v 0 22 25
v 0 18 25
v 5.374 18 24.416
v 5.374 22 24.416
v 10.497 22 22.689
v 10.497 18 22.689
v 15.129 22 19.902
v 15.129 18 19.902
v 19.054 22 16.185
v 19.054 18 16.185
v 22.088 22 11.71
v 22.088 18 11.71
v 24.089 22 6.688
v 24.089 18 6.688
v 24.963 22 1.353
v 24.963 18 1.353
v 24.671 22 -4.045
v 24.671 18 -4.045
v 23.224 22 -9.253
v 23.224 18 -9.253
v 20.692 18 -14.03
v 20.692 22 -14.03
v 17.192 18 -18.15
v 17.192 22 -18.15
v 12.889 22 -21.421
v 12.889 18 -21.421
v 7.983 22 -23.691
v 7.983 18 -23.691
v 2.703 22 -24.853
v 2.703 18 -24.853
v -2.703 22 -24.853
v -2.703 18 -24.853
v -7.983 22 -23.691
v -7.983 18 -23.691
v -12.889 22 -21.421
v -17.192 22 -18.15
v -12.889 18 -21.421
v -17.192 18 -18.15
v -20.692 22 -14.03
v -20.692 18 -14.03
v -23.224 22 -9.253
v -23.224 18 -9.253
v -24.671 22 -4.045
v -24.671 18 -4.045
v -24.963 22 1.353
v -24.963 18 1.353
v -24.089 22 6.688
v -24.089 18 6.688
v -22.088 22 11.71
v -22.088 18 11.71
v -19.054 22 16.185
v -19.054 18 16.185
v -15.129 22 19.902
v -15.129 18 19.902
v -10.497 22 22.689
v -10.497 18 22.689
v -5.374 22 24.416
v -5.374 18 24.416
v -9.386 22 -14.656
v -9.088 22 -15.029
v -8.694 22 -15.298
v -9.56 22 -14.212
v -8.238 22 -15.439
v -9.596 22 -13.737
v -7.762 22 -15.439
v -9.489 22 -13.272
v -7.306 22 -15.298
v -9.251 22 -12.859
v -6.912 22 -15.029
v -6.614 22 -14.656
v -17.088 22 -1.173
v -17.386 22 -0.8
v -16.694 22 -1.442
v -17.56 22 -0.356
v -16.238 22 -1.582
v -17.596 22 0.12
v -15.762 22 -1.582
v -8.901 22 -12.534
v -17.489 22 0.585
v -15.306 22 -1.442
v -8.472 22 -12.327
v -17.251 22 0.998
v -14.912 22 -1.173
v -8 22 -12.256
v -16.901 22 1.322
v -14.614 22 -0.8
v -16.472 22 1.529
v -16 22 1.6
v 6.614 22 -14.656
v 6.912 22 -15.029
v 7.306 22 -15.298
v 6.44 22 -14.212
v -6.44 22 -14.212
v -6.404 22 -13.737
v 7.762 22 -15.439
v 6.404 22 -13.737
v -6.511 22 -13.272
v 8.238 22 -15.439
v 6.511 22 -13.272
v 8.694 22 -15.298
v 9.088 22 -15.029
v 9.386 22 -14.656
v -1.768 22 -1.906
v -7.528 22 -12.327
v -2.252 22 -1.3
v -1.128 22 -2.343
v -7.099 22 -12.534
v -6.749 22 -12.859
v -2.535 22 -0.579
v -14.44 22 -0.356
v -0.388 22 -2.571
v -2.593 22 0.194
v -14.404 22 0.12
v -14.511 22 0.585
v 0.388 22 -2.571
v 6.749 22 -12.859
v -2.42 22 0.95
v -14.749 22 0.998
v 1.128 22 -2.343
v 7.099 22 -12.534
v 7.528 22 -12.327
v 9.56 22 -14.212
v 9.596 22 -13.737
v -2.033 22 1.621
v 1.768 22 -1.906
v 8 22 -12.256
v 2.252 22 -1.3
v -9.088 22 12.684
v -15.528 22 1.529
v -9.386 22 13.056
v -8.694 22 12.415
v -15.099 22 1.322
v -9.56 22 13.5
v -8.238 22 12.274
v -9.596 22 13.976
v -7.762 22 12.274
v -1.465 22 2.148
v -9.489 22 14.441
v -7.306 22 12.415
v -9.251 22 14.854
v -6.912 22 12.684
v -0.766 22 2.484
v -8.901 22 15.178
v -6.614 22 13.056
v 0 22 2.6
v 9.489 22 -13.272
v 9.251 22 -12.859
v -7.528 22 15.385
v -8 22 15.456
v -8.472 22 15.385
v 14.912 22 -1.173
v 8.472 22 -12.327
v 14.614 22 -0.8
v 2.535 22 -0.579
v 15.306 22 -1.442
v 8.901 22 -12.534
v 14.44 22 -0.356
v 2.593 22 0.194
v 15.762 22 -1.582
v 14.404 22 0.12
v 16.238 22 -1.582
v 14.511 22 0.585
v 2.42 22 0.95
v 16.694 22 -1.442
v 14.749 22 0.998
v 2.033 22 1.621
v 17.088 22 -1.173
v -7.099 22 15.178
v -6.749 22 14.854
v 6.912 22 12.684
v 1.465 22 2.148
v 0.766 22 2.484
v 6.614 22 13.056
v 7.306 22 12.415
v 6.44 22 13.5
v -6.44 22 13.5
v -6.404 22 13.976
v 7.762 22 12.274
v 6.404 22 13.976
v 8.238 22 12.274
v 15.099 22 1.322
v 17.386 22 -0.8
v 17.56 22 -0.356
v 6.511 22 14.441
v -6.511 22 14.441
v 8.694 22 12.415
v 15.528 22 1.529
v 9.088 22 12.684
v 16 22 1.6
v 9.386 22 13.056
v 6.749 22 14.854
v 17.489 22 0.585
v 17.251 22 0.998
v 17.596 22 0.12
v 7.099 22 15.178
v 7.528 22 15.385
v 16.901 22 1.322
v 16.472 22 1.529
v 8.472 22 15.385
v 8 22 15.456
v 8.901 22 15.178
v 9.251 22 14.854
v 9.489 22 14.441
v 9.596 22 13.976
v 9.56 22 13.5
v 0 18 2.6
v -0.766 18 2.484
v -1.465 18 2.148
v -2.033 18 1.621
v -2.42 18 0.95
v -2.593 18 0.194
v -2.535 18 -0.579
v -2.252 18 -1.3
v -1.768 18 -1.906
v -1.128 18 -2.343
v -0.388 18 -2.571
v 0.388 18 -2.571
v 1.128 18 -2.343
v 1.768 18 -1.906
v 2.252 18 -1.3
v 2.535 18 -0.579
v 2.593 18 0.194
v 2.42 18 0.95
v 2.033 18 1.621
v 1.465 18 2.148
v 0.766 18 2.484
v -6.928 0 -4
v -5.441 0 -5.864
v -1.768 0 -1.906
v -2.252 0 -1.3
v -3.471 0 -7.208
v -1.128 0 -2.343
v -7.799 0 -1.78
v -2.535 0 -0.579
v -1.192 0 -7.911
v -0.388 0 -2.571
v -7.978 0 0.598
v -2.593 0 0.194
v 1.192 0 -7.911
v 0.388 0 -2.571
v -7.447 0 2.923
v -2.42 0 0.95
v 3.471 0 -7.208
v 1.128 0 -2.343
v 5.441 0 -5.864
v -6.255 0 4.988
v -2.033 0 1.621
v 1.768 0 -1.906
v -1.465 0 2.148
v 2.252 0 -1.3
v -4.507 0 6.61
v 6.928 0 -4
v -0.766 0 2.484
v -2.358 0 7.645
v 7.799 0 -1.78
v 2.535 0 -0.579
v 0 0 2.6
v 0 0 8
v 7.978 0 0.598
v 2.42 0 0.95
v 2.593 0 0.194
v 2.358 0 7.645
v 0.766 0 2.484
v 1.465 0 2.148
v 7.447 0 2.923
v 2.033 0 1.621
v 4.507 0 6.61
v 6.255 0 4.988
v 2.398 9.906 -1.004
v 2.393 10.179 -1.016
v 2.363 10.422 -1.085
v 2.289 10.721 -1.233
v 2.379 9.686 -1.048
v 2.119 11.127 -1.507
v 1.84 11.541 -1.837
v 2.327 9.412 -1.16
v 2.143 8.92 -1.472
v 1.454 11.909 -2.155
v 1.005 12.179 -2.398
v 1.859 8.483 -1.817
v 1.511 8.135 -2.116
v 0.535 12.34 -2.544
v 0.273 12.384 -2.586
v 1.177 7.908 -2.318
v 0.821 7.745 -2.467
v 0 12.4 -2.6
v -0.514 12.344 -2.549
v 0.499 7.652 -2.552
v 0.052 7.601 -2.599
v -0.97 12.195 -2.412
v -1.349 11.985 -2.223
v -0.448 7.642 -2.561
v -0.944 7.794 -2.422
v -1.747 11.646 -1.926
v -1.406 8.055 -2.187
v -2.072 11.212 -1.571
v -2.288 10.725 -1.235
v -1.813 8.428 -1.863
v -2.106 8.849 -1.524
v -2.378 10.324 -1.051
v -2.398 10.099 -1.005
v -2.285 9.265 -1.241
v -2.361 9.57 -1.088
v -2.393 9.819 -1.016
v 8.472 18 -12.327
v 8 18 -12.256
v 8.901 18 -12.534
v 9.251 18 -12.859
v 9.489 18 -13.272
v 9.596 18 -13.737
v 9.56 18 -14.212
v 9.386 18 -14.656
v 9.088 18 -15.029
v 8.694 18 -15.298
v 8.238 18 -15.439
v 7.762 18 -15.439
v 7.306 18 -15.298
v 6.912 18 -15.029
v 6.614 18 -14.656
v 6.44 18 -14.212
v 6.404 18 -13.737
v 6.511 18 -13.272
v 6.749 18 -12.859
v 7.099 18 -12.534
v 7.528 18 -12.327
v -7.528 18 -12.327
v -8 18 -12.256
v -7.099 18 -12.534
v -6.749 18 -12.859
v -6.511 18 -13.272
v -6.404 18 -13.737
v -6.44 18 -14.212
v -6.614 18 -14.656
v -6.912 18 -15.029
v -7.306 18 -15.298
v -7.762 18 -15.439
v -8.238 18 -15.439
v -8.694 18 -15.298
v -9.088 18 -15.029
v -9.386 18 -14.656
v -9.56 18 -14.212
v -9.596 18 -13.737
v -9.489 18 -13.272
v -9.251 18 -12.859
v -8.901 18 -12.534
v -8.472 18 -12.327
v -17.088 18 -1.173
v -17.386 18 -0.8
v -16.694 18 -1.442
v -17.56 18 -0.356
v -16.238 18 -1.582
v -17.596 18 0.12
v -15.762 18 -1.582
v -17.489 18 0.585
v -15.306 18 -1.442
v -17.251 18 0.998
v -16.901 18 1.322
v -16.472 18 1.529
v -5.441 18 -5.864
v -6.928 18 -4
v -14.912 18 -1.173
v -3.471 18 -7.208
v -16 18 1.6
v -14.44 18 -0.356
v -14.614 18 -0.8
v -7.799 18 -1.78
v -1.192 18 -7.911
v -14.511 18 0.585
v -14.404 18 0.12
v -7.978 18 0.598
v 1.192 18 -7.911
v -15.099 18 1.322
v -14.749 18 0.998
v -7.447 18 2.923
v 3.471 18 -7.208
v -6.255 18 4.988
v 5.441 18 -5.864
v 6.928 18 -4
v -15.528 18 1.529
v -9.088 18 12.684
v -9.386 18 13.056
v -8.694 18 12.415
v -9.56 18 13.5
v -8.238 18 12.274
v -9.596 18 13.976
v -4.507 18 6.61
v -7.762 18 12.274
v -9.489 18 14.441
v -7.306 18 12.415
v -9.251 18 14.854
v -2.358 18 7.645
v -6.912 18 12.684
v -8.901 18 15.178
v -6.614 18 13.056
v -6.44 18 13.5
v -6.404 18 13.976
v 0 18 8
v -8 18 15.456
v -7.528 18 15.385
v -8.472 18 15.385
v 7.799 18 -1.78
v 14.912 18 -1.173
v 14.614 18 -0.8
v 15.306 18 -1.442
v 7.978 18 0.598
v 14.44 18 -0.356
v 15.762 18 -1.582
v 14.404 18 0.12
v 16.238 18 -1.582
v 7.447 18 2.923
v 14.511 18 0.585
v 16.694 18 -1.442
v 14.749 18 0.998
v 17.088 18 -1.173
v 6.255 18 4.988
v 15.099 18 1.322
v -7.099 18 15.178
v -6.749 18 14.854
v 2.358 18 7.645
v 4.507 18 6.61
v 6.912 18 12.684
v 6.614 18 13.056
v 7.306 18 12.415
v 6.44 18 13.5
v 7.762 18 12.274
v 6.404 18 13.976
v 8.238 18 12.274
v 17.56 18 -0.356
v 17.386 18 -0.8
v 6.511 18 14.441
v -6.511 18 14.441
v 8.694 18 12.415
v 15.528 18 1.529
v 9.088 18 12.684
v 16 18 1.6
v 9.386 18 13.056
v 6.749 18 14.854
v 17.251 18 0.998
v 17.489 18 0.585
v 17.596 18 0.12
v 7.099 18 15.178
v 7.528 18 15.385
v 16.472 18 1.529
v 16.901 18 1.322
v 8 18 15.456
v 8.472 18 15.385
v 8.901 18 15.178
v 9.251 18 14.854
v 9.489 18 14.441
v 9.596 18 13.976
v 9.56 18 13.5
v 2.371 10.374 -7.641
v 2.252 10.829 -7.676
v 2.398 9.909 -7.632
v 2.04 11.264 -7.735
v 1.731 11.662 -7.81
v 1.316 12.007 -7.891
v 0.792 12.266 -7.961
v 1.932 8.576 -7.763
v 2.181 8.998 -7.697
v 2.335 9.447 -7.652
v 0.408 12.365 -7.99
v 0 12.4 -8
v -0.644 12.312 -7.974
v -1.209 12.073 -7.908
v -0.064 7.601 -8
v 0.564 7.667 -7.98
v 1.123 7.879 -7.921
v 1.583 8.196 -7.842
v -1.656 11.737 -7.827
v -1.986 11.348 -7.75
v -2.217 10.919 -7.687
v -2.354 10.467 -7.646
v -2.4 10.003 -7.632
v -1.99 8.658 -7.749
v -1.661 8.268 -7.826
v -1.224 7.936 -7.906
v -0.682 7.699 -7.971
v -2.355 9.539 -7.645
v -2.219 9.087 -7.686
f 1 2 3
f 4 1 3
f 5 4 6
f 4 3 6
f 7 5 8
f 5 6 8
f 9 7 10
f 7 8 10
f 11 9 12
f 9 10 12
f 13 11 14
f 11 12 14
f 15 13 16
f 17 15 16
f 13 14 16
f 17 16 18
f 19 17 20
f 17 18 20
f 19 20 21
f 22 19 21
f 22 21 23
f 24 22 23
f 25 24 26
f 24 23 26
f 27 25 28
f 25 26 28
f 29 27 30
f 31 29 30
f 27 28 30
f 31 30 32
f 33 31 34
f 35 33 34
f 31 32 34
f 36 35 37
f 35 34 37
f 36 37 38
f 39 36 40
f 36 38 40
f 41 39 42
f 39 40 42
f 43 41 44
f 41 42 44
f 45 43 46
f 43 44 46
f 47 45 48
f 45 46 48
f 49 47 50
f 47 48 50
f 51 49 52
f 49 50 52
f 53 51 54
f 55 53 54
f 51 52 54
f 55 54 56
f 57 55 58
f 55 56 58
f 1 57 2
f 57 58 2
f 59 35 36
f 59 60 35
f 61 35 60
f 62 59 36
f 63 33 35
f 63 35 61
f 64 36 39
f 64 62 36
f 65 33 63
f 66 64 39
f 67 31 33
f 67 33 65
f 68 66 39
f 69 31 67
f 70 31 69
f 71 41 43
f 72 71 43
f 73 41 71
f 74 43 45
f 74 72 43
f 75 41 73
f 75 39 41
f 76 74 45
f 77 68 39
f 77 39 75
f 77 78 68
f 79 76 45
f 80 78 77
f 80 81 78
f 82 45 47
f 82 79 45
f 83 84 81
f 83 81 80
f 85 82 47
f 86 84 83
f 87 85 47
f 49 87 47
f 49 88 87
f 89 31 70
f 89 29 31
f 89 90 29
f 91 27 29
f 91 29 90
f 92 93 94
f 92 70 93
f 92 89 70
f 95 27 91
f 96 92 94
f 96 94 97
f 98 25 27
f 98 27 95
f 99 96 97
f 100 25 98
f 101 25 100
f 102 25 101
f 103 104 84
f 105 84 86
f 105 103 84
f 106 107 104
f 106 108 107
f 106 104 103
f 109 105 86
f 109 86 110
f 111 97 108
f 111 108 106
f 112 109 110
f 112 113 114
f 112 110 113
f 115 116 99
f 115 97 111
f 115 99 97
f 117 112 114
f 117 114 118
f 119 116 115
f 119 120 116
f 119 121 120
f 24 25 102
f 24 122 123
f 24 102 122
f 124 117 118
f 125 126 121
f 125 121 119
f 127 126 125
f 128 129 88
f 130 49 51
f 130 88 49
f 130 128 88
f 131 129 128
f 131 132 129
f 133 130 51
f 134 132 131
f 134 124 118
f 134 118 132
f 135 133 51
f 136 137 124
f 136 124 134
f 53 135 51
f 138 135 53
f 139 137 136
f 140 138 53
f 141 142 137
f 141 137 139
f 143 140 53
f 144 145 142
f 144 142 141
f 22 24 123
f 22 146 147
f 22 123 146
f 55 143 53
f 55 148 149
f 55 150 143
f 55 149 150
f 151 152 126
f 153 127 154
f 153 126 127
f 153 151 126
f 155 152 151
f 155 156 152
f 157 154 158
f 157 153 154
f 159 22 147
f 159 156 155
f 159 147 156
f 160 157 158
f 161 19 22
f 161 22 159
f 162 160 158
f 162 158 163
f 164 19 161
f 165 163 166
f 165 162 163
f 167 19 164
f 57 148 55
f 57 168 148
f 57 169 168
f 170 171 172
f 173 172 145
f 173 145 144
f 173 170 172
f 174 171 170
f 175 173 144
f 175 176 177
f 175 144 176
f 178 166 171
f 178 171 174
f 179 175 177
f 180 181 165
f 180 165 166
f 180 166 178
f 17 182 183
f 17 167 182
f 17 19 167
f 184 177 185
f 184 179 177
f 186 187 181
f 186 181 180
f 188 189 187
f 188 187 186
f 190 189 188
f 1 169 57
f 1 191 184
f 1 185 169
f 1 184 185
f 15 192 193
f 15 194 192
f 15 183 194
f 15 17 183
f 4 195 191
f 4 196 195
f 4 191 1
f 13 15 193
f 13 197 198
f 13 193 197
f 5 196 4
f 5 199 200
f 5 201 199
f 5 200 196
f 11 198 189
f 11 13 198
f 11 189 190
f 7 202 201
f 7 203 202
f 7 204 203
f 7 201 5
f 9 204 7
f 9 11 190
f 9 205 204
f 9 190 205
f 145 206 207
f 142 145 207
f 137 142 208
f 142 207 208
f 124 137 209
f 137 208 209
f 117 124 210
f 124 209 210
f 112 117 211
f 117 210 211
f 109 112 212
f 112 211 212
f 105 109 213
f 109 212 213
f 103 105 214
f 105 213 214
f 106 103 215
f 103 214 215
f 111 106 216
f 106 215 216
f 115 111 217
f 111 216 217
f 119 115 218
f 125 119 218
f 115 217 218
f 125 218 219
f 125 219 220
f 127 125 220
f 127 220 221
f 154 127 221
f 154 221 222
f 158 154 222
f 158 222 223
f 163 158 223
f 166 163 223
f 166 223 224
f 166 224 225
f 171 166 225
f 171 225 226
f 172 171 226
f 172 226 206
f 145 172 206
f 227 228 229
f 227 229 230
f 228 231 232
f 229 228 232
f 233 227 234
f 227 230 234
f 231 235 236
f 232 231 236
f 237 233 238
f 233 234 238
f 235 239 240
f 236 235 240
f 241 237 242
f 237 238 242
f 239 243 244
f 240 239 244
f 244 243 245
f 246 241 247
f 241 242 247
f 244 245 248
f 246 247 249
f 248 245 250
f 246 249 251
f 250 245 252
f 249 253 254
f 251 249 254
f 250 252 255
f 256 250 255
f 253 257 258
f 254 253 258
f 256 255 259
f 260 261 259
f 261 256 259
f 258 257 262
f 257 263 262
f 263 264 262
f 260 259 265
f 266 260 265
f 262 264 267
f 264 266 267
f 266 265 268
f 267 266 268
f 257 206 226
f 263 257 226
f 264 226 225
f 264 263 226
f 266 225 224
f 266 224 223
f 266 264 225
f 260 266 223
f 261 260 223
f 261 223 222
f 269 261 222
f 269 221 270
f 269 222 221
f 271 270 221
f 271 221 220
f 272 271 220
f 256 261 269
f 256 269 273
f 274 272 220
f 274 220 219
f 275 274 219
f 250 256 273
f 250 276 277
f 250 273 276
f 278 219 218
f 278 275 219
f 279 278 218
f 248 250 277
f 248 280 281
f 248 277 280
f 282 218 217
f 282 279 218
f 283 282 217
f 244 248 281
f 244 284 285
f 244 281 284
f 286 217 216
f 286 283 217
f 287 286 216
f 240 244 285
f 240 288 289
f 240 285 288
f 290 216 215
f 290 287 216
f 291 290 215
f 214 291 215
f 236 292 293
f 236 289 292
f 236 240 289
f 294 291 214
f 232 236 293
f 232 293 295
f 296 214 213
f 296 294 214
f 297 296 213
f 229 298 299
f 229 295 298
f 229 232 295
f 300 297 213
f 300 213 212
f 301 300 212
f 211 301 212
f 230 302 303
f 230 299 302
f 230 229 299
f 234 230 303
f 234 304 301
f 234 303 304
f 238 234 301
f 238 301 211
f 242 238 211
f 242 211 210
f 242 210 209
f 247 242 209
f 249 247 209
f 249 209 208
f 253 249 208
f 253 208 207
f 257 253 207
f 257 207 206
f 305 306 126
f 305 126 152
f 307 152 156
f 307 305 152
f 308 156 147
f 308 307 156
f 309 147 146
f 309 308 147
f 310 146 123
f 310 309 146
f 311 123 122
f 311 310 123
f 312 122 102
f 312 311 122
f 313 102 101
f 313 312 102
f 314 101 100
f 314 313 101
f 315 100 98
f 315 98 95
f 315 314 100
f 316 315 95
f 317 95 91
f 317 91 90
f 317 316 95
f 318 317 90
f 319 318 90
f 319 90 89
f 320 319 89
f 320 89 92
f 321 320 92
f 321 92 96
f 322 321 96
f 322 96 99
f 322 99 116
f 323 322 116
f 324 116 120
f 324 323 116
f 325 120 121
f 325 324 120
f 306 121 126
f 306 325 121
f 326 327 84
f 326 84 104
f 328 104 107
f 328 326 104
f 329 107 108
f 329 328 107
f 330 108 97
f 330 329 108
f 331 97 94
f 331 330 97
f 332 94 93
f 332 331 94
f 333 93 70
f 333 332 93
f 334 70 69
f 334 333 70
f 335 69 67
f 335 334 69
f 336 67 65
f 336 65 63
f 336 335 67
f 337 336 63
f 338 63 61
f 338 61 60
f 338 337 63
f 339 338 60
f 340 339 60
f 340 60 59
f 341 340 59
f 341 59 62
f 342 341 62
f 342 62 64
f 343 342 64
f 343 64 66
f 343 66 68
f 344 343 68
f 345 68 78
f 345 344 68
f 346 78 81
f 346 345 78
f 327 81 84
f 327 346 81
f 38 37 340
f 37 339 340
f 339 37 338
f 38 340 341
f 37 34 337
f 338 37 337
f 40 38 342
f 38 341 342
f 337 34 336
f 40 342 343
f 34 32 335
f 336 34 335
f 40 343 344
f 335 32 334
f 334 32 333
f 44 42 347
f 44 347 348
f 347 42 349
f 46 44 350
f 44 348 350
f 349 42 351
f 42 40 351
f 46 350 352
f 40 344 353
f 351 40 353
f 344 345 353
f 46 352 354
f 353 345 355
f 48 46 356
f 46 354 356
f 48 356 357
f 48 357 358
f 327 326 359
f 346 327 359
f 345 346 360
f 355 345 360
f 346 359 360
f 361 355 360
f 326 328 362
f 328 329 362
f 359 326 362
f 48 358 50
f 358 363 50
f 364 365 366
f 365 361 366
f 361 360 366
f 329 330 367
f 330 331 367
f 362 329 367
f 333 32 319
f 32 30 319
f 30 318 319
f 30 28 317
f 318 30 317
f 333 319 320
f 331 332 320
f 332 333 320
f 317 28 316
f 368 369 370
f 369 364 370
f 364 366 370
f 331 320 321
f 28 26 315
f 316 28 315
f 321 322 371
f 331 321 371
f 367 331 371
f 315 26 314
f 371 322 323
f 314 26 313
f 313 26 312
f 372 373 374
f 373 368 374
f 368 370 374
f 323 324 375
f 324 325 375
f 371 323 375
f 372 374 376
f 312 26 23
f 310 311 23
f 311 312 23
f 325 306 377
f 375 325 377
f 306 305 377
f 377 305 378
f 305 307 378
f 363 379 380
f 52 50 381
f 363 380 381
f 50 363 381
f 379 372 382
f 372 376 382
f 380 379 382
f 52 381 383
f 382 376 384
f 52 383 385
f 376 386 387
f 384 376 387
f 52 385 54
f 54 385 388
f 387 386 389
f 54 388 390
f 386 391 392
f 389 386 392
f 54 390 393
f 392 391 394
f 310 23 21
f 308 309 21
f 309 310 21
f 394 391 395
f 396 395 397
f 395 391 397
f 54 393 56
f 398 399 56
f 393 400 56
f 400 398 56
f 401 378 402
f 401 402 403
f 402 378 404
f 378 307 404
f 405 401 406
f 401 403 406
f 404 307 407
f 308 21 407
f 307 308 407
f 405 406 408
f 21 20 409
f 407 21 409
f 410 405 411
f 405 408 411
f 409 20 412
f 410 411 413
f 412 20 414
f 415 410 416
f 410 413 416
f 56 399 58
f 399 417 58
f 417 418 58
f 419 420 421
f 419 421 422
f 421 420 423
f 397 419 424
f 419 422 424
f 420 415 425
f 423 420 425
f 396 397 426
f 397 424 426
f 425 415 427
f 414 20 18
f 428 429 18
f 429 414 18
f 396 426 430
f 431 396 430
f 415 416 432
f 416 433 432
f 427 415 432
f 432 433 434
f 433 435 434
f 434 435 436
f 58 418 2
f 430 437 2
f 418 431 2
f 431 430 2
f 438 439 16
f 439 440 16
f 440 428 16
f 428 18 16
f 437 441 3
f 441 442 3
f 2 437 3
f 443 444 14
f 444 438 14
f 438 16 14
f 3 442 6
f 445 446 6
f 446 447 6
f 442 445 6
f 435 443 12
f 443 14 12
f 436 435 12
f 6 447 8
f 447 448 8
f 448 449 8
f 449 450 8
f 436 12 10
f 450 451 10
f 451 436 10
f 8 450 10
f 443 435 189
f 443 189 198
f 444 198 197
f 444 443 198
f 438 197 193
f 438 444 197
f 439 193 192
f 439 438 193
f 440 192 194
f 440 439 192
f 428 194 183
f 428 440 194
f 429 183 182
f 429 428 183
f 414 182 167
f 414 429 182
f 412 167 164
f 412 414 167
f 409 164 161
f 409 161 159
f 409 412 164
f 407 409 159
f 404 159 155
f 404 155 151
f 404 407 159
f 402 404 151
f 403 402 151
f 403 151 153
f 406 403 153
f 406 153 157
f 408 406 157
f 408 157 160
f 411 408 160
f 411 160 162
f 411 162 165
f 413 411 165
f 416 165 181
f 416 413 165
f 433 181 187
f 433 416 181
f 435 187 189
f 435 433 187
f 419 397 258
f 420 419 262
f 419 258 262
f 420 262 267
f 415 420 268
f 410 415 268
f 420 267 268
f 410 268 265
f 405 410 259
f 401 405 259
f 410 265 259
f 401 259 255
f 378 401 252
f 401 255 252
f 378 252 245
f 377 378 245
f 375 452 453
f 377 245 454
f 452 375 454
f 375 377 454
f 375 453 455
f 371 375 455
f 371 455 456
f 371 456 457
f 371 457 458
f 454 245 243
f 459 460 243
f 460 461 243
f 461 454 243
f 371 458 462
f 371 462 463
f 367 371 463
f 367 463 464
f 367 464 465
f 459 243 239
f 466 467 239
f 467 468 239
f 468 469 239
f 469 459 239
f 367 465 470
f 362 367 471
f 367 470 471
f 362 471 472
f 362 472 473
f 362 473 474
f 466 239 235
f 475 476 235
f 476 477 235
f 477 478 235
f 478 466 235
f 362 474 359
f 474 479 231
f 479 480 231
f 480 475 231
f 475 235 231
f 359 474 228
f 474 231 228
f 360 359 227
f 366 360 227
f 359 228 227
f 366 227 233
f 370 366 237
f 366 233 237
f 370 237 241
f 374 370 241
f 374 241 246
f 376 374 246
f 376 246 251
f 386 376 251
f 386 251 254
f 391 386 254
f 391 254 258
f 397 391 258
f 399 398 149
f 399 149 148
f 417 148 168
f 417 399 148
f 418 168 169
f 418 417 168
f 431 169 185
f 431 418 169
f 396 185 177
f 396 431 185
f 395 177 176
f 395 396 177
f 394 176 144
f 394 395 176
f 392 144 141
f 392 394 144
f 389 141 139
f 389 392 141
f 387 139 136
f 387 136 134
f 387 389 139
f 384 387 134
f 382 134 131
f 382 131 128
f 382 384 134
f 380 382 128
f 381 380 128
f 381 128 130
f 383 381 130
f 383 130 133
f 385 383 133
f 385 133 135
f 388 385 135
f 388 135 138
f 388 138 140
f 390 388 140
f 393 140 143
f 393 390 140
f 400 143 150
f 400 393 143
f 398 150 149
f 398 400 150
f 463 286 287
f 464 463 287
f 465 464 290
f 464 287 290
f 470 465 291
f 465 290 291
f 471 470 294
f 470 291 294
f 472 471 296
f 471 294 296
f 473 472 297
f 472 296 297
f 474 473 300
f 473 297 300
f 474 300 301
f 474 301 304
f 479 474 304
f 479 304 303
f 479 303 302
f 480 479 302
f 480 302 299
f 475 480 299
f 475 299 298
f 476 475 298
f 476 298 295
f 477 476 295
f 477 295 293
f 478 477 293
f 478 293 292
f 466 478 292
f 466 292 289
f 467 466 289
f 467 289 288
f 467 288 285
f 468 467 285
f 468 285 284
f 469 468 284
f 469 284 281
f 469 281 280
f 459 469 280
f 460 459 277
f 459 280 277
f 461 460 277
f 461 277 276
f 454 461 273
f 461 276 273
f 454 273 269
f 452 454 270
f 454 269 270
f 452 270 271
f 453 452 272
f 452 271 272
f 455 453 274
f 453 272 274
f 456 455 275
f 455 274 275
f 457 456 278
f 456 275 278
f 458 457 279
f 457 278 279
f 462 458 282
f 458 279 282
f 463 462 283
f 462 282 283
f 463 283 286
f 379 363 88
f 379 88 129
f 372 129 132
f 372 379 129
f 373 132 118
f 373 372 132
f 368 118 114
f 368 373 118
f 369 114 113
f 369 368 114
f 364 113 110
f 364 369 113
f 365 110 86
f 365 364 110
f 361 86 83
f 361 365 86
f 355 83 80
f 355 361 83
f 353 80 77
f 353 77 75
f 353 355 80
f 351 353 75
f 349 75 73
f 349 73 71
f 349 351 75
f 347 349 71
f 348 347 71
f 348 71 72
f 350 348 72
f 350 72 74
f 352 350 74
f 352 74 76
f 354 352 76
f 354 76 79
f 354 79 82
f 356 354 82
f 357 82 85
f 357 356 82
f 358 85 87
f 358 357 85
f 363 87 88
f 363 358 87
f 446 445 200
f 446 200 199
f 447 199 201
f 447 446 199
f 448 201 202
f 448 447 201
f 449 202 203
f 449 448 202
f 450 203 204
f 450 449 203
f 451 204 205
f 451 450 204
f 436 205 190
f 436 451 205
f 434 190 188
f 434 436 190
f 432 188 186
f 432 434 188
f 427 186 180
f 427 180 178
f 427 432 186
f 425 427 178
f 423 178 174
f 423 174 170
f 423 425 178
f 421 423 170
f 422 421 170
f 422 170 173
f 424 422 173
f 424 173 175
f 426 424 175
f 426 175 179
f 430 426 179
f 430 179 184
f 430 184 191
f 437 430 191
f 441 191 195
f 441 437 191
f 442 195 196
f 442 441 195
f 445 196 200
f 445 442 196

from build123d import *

# Parameters (mm, degrees)
SKETCH_1_R          = 8
SKETCH_1_R_2        = 2.6
EXTRUDE_1_DEPTH     = 18
SKETCH_2_R          = 25
SKETCH_2_R_2        = 1.6
EXTRUDE_2_DEPTH     = 4
SKETCH_4_R          = 2.4
CUT_EXTRUDE_1_DEPTH = 10
SKETCH_5_R          = 2.6
CUT_EXTRUDE_2_DEPTH = 10


with BuildPart() as part:
    # 草图1 → 凸台-拉伸1 (new body)
    with BuildSketch(Plane(origin=(0, 0, 0), x_dir=(1, 0, 0), z_dir=(0, 1, 0))):
        with Locations(Location((0, 0, 0), (0, 0, 270))):
            Circle(SKETCH_1_R)
        with Locations(Location((0, 0, 0), (0, 0, 270))):
            Circle(SKETCH_1_R_2, mode=Mode.SUBTRACT)
    extrude(amount=EXTRUDE_1_DEPTH)

    # 草图2 → 凸台-拉伸2 (add)
    with BuildSketch(Plane(origin=(0, 18, 0), x_dir=(1, 0, 0), z_dir=(0, 1, 0))):
        with Locations(Location((0, 0, 0), (0, 0, 270))):
            Circle(SKETCH_2_R)
        with Locations(Location((16, 0, 0), (0, 0, 270))):
            Circle(SKETCH_2_R_2, mode=Mode.SUBTRACT)
        with Locations(Location((8, -13.856406461, 0), (0, 0, 270))):
            Circle(SKETCH_2_R_2, mode=Mode.SUBTRACT)
        with Locations(Location((-8, -13.856406461, 0), (0, 0, 270))):
            Circle(SKETCH_2_R_2, mode=Mode.SUBTRACT)
        with Locations(Location((-16, 0, 0), (0, 0, 270))):
            Circle(SKETCH_2_R_2, mode=Mode.SUBTRACT)
        with Locations(Location((-8, 13.856406461, 0), (0, 0, 270))):
            Circle(SKETCH_2_R_2, mode=Mode.SUBTRACT)
        with Locations(Location((8, 13.856406461, 0), (0, 0, 270))):
            Circle(SKETCH_2_R_2, mode=Mode.SUBTRACT)
    extrude(amount=EXTRUDE_2_DEPTH)

    # 草图4 → 切除-拉伸1 (cut)
    with BuildSketch(Plane.XY):
        with Locations(Location((0, 10, 0), (0, 0, 90))):
            Circle(SKETCH_4_R)
    extrude(amount=-CUT_EXTRUDE_1_DEPTH, mode=Mode.SUBTRACT)

    # 草图5 → 切除-拉伸2 (cut)
    with BuildSketch(Plane.XZ.offset(-18)):
        with Locations(Location((0, 0, 0), (0, 0, 90))):
            Circle(SKETCH_5_R)
    extrude(amount=-CUT_EXTRUDE_2_DEPTH, mode=Mode.SUBTRACT)


solid = part.part
